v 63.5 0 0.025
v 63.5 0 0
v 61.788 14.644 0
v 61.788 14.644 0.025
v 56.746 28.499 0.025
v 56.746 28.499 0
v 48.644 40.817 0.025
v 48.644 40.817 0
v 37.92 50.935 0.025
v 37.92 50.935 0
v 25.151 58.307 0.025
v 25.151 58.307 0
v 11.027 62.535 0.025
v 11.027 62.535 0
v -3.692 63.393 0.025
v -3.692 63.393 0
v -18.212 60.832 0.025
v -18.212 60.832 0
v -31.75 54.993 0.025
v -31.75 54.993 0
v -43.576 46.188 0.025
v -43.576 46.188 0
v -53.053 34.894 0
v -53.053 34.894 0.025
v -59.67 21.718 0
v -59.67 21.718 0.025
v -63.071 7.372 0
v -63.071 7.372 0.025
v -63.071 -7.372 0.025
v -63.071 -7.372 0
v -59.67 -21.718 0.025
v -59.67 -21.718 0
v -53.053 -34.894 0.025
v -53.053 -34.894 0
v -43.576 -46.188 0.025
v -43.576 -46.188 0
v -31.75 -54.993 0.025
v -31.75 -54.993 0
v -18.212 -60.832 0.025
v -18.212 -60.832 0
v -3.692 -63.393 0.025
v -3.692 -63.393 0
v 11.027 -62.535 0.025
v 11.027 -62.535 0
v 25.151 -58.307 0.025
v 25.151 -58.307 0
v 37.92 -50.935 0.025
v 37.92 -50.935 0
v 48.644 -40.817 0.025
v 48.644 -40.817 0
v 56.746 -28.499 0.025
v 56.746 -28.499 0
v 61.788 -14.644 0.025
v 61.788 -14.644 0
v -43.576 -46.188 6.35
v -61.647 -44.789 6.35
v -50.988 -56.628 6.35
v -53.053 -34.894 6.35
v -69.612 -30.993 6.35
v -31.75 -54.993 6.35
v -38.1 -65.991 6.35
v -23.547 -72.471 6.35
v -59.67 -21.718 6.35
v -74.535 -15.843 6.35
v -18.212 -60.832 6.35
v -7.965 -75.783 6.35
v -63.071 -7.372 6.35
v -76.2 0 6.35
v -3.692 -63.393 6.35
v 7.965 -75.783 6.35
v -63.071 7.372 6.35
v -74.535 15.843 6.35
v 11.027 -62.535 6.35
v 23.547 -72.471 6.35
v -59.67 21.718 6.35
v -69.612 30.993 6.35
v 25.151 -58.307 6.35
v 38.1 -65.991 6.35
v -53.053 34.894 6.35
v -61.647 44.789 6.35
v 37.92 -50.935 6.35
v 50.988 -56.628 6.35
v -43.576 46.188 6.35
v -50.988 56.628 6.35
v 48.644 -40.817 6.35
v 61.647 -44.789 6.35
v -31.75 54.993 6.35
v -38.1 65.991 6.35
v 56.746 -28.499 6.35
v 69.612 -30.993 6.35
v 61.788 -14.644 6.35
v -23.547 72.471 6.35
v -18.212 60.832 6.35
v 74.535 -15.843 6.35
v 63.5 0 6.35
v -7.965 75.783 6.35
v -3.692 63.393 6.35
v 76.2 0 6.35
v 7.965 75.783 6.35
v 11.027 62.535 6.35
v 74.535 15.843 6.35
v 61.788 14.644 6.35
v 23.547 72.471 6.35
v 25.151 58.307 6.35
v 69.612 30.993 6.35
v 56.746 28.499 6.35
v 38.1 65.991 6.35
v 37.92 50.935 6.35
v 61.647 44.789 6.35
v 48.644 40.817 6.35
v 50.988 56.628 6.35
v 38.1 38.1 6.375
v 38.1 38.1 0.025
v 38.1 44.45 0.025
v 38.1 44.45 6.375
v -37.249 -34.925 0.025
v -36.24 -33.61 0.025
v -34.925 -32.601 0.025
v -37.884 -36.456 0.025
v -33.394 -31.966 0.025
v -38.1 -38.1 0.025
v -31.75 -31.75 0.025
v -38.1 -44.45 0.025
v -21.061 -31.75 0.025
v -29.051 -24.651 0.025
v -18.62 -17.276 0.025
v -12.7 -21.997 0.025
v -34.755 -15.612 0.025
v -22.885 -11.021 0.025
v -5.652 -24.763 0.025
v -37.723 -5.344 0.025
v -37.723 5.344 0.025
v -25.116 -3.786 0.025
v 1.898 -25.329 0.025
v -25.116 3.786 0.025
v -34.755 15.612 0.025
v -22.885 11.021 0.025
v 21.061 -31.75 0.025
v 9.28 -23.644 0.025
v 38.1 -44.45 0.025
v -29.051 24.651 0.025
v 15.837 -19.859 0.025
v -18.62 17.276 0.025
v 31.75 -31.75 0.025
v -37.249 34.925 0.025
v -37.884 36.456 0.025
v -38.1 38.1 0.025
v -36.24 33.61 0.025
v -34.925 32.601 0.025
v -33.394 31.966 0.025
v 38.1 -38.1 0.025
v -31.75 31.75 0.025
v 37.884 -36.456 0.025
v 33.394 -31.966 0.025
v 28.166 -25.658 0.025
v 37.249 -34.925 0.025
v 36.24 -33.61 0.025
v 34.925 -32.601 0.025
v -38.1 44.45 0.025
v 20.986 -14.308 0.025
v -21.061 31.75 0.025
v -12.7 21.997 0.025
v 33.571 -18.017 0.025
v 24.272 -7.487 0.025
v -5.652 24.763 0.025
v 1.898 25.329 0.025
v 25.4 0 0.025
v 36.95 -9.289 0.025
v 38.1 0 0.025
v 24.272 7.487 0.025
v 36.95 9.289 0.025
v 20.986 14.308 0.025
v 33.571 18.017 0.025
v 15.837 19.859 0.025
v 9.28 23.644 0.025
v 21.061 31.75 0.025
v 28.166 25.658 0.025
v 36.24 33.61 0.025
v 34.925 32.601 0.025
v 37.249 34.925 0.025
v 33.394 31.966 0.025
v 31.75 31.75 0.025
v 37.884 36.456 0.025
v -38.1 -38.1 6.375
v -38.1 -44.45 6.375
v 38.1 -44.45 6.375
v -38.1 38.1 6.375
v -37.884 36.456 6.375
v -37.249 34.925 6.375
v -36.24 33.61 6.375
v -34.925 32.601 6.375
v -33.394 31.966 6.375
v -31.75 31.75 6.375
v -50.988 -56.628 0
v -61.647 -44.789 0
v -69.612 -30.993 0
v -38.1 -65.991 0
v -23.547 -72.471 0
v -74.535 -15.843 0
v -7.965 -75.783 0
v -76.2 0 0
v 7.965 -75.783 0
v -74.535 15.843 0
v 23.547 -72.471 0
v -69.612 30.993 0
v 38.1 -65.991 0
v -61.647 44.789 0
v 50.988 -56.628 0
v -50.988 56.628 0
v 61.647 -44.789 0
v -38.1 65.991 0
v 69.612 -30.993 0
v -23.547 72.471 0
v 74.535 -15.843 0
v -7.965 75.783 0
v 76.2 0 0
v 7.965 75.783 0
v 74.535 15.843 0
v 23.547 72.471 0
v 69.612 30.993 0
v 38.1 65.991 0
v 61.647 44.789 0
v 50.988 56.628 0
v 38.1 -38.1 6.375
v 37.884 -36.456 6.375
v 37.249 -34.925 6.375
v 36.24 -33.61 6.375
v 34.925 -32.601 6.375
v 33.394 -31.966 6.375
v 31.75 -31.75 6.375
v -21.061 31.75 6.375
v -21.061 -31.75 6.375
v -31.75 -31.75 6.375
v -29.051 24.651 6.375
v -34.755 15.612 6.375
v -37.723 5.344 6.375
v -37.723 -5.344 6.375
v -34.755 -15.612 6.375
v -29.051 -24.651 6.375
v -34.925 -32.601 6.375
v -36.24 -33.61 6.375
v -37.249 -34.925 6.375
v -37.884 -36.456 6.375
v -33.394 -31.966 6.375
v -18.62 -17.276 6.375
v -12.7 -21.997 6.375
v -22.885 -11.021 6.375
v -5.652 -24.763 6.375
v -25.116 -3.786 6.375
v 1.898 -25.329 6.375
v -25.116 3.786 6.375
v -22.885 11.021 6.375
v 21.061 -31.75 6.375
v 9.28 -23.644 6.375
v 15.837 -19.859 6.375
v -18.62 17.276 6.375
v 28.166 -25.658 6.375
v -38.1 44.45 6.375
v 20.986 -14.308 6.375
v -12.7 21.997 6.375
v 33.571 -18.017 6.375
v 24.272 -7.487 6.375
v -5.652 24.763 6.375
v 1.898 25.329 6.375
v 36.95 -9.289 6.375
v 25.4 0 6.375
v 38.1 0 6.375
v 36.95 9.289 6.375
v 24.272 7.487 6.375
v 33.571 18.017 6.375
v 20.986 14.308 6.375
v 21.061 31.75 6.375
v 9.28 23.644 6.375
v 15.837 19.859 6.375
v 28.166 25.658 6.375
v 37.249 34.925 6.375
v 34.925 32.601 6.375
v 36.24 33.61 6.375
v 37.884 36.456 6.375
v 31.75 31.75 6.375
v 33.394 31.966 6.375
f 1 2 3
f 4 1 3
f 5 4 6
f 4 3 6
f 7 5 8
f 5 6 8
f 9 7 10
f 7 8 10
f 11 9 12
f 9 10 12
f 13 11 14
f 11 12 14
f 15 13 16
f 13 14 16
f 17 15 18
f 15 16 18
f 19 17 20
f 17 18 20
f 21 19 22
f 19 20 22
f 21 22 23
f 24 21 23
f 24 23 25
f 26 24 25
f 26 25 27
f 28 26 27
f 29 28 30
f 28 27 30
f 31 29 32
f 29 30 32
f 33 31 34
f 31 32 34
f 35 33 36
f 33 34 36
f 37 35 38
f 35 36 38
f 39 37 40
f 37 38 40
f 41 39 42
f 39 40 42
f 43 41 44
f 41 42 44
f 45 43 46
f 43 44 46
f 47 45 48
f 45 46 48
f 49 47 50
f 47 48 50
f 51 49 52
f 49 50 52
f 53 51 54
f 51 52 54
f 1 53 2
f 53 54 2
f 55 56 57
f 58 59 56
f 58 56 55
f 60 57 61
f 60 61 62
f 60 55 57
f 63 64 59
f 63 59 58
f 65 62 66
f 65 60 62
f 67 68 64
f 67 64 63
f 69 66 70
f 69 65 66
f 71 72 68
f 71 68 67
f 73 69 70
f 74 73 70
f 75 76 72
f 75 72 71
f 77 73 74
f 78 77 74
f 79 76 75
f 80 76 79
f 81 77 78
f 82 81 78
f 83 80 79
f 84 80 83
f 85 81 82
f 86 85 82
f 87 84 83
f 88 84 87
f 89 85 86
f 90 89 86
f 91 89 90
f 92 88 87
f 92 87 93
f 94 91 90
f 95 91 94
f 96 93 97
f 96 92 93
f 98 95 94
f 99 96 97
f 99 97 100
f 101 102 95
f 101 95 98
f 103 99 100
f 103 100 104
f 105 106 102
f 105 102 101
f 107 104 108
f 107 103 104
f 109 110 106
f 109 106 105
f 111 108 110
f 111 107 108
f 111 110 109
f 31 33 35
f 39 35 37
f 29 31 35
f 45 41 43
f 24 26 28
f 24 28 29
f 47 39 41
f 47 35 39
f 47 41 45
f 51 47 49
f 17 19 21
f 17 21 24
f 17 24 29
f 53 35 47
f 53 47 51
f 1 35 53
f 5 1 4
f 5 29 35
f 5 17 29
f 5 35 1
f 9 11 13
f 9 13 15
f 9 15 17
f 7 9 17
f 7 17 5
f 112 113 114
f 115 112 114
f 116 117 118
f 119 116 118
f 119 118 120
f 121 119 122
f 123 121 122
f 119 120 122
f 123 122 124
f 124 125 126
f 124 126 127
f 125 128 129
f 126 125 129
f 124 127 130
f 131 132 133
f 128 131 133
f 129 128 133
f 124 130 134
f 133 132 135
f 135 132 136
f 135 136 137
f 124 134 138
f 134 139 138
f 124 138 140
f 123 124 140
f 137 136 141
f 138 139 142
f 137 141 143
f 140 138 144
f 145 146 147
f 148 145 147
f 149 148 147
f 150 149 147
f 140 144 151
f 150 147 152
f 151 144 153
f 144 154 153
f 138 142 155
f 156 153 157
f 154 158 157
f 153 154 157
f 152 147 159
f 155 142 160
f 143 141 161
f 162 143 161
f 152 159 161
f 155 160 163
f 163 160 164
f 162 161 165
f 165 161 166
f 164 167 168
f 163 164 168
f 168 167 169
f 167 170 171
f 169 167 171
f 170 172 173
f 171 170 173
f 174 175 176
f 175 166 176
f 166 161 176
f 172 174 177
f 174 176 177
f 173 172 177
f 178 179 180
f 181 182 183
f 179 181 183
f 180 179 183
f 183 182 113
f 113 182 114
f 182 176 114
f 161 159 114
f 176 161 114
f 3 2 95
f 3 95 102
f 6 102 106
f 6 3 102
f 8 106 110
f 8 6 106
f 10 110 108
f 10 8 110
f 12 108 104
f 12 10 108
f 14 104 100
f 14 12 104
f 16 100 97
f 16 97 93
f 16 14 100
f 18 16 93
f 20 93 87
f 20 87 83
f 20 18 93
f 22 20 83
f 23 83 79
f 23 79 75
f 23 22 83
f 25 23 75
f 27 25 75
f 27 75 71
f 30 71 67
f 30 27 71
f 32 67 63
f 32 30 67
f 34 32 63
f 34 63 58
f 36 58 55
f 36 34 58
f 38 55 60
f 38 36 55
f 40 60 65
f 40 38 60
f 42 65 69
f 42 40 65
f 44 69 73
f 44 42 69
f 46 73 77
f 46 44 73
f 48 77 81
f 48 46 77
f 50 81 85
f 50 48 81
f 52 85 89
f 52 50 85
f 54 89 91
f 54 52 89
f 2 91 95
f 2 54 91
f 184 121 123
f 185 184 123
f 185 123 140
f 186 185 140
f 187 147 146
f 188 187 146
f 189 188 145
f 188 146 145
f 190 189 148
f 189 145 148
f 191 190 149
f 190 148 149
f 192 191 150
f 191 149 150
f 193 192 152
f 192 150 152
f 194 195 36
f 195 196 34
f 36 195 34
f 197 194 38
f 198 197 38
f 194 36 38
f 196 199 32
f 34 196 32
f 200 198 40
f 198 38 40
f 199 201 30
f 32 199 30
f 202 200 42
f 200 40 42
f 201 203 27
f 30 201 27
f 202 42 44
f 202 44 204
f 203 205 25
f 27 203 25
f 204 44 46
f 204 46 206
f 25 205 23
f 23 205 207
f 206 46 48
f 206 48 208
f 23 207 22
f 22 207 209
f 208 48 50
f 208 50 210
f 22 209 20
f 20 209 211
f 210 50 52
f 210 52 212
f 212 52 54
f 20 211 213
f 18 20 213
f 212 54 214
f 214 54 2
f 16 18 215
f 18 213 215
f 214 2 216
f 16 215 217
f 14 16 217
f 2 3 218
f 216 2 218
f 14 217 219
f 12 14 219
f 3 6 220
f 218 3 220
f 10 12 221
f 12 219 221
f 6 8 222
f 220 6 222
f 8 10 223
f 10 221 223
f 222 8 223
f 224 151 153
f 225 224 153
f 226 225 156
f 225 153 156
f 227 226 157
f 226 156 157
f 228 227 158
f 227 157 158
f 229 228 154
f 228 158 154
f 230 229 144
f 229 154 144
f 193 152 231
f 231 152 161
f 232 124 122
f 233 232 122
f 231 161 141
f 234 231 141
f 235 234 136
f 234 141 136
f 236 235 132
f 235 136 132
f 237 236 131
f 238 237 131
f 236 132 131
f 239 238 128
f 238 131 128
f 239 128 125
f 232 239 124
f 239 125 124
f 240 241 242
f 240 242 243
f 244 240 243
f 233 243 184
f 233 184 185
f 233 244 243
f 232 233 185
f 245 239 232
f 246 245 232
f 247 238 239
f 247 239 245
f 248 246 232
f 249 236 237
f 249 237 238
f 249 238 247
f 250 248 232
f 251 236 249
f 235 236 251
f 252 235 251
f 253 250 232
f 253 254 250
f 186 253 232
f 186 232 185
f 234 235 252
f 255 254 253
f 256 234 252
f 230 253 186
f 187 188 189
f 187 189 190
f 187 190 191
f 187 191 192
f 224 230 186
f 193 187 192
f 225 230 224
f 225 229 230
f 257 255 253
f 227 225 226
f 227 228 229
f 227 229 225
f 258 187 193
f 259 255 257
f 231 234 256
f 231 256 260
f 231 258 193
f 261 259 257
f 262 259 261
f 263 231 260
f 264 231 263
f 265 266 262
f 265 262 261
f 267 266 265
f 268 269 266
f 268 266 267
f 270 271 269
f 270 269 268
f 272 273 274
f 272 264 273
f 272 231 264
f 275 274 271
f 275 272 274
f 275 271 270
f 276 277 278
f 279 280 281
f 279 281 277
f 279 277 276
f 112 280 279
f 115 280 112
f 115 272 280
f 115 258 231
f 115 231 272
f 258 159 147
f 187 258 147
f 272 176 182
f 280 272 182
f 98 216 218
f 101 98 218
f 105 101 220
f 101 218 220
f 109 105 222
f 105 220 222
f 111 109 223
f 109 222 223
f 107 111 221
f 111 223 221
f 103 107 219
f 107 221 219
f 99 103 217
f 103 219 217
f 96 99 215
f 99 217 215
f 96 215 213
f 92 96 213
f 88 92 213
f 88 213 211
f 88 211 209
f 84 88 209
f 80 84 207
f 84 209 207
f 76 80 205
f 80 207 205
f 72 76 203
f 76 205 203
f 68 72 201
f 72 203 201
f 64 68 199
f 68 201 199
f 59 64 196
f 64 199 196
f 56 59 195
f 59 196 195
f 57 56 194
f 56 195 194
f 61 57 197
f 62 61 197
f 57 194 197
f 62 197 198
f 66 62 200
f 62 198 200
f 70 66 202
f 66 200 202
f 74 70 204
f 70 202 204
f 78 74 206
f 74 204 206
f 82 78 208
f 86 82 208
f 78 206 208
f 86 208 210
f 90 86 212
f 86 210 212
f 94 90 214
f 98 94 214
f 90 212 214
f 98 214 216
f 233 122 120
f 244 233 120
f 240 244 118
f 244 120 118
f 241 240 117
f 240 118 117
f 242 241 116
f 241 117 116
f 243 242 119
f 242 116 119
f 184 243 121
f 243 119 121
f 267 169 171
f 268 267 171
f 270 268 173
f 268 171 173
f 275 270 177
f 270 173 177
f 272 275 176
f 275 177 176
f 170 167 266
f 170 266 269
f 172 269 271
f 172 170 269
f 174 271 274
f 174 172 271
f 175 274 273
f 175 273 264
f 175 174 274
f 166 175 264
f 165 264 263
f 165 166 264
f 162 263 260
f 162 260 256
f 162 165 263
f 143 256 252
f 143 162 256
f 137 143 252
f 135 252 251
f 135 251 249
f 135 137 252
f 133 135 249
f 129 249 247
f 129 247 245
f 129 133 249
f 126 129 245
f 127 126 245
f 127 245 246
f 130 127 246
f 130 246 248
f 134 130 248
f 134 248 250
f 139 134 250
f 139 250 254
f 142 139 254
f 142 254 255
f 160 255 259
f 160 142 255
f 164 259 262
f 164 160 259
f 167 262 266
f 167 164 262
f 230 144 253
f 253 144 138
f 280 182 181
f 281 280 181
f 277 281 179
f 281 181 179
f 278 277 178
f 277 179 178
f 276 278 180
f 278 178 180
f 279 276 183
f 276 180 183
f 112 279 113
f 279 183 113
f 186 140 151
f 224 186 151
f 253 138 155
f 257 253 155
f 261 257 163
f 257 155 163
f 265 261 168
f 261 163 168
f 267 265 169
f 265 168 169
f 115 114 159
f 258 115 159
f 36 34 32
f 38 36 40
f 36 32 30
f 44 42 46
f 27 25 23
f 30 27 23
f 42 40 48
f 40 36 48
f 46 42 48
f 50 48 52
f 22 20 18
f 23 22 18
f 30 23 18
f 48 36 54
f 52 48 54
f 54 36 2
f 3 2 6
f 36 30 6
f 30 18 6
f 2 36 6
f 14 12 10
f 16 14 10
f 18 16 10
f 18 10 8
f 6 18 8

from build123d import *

# Parameters (mm, degrees)
F0_R     = 63.5
F1_DEPTH = 0.0254
F2_R     = 25.4
F3_DEPTH = 6.35
F4_R     = 76.2
F4_R_2   = 63.5
F5_DEPTH = 6.35


with BuildPart() as f1:
    # F0 (on Top) → F1 (new body)
    with BuildSketch(Plane.XY):
        Circle(F0_R)
    extrude(amount=F1_DEPTH)


with BuildPart() as f3:
    # F2 (on face) → F3 (new body)
    with BuildSketch(Plane.XY.offset(0.0254)):
        with BuildLine():
            ThreePointArc((21.0605674188, -31.75), (33.5709518681, -18.0166920014), (38.1, 0))
            ThreePointArc((38.1, 0), (33.5709518681, 18.0166920014), (21.0605674188, 31.75))
            Line((21.0605674188, 31.75), (0, 31.75))
            Line((0, 31.75), (-21.0605674188, 31.75))
            ThreePointArc((-21.0605674188, 31.75), (-38.1, 0), (-21.0605674188, -31.75))
            Line((-21.0605674188, -31.75), (0, -31.75))
            Line((0, -31.75), (21.0605674188, -31.75))
        make_face()
        Circle(F2_R, mode=Mode.SUBTRACT)
        with BuildLine():
            Line((0, 31.75), (21.0605674188, 31.75))
            ThreePointArc((21.0605674188, 31.75), (0, 38.1), (-21.0605674188, 31.75))
            Line((-21.0605674188, 31.75), (0, 31.75))
        make_face()
        with BuildLine():
            ThreePointArc((-21.0605674188, 31.75), (0, 38.1), (21.0605674188, 31.75))
            Line((21.0605674188, 31.75), (31.75, 31.75))
            ThreePointArc((31.75, 31.75), (36.2401280605, 33.6098719395), (38.1, 38.1))
            Line((38.1, 38.1), (38.1, 44.45))
            Line((38.1, 44.45), (-38.1, 44.45))
            Line((-38.1, 44.45), (-38.1, 38.1))
            ThreePointArc((-38.1, 38.1), (-36.2401280605, 33.6098719395), (-31.75, 31.75))
            Line((-31.75, 31.75), (-21.0605674188, 31.75))
        make_face()
        with BuildLine():
            Line((31.75, -31.75), (21.0605674188, -31.75))
            ThreePointArc((21.0605674188, -31.75), (0, -38.1), (-21.0605674188, -31.75))
            Line((-21.0605674188, -31.75), (-31.75, -31.75))
            ThreePointArc((-31.75, -31.75), (-36.2401280605, -33.6098719395), (-38.1, -38.1))
            Line((-38.1, -38.1), (-38.1, -44.45))
            Line((-38.1, -44.45), (38.1, -44.45))
            Line((38.1, -44.45), (38.1, -38.1))
            ThreePointArc((38.1, -38.1), (36.2401280605, -33.6098719395), (31.75, -31.75))
        make_face()
        with BuildLine():
            ThreePointArc((-21.0605674188, -31.75), (0, -38.1), (21.0605674188, -31.75))
            Line((21.0605674188, -31.75), (0, -31.75))
            Line((0, -31.75), (-21.0605674188, -31.75))
        make_face()
    extrude(amount=F3_DEPTH)


with BuildPart() as f5:
    # F4 (on Top) → F5 (new body)
    with BuildSketch(Plane.XY):
        Circle(F4_R)
        Circle(F4_R_2, mode=Mode.SUBTRACT)
    extrude(amount=F5_DEPTH)


solid = Compound([f1.part, f3.part, f5.part])
